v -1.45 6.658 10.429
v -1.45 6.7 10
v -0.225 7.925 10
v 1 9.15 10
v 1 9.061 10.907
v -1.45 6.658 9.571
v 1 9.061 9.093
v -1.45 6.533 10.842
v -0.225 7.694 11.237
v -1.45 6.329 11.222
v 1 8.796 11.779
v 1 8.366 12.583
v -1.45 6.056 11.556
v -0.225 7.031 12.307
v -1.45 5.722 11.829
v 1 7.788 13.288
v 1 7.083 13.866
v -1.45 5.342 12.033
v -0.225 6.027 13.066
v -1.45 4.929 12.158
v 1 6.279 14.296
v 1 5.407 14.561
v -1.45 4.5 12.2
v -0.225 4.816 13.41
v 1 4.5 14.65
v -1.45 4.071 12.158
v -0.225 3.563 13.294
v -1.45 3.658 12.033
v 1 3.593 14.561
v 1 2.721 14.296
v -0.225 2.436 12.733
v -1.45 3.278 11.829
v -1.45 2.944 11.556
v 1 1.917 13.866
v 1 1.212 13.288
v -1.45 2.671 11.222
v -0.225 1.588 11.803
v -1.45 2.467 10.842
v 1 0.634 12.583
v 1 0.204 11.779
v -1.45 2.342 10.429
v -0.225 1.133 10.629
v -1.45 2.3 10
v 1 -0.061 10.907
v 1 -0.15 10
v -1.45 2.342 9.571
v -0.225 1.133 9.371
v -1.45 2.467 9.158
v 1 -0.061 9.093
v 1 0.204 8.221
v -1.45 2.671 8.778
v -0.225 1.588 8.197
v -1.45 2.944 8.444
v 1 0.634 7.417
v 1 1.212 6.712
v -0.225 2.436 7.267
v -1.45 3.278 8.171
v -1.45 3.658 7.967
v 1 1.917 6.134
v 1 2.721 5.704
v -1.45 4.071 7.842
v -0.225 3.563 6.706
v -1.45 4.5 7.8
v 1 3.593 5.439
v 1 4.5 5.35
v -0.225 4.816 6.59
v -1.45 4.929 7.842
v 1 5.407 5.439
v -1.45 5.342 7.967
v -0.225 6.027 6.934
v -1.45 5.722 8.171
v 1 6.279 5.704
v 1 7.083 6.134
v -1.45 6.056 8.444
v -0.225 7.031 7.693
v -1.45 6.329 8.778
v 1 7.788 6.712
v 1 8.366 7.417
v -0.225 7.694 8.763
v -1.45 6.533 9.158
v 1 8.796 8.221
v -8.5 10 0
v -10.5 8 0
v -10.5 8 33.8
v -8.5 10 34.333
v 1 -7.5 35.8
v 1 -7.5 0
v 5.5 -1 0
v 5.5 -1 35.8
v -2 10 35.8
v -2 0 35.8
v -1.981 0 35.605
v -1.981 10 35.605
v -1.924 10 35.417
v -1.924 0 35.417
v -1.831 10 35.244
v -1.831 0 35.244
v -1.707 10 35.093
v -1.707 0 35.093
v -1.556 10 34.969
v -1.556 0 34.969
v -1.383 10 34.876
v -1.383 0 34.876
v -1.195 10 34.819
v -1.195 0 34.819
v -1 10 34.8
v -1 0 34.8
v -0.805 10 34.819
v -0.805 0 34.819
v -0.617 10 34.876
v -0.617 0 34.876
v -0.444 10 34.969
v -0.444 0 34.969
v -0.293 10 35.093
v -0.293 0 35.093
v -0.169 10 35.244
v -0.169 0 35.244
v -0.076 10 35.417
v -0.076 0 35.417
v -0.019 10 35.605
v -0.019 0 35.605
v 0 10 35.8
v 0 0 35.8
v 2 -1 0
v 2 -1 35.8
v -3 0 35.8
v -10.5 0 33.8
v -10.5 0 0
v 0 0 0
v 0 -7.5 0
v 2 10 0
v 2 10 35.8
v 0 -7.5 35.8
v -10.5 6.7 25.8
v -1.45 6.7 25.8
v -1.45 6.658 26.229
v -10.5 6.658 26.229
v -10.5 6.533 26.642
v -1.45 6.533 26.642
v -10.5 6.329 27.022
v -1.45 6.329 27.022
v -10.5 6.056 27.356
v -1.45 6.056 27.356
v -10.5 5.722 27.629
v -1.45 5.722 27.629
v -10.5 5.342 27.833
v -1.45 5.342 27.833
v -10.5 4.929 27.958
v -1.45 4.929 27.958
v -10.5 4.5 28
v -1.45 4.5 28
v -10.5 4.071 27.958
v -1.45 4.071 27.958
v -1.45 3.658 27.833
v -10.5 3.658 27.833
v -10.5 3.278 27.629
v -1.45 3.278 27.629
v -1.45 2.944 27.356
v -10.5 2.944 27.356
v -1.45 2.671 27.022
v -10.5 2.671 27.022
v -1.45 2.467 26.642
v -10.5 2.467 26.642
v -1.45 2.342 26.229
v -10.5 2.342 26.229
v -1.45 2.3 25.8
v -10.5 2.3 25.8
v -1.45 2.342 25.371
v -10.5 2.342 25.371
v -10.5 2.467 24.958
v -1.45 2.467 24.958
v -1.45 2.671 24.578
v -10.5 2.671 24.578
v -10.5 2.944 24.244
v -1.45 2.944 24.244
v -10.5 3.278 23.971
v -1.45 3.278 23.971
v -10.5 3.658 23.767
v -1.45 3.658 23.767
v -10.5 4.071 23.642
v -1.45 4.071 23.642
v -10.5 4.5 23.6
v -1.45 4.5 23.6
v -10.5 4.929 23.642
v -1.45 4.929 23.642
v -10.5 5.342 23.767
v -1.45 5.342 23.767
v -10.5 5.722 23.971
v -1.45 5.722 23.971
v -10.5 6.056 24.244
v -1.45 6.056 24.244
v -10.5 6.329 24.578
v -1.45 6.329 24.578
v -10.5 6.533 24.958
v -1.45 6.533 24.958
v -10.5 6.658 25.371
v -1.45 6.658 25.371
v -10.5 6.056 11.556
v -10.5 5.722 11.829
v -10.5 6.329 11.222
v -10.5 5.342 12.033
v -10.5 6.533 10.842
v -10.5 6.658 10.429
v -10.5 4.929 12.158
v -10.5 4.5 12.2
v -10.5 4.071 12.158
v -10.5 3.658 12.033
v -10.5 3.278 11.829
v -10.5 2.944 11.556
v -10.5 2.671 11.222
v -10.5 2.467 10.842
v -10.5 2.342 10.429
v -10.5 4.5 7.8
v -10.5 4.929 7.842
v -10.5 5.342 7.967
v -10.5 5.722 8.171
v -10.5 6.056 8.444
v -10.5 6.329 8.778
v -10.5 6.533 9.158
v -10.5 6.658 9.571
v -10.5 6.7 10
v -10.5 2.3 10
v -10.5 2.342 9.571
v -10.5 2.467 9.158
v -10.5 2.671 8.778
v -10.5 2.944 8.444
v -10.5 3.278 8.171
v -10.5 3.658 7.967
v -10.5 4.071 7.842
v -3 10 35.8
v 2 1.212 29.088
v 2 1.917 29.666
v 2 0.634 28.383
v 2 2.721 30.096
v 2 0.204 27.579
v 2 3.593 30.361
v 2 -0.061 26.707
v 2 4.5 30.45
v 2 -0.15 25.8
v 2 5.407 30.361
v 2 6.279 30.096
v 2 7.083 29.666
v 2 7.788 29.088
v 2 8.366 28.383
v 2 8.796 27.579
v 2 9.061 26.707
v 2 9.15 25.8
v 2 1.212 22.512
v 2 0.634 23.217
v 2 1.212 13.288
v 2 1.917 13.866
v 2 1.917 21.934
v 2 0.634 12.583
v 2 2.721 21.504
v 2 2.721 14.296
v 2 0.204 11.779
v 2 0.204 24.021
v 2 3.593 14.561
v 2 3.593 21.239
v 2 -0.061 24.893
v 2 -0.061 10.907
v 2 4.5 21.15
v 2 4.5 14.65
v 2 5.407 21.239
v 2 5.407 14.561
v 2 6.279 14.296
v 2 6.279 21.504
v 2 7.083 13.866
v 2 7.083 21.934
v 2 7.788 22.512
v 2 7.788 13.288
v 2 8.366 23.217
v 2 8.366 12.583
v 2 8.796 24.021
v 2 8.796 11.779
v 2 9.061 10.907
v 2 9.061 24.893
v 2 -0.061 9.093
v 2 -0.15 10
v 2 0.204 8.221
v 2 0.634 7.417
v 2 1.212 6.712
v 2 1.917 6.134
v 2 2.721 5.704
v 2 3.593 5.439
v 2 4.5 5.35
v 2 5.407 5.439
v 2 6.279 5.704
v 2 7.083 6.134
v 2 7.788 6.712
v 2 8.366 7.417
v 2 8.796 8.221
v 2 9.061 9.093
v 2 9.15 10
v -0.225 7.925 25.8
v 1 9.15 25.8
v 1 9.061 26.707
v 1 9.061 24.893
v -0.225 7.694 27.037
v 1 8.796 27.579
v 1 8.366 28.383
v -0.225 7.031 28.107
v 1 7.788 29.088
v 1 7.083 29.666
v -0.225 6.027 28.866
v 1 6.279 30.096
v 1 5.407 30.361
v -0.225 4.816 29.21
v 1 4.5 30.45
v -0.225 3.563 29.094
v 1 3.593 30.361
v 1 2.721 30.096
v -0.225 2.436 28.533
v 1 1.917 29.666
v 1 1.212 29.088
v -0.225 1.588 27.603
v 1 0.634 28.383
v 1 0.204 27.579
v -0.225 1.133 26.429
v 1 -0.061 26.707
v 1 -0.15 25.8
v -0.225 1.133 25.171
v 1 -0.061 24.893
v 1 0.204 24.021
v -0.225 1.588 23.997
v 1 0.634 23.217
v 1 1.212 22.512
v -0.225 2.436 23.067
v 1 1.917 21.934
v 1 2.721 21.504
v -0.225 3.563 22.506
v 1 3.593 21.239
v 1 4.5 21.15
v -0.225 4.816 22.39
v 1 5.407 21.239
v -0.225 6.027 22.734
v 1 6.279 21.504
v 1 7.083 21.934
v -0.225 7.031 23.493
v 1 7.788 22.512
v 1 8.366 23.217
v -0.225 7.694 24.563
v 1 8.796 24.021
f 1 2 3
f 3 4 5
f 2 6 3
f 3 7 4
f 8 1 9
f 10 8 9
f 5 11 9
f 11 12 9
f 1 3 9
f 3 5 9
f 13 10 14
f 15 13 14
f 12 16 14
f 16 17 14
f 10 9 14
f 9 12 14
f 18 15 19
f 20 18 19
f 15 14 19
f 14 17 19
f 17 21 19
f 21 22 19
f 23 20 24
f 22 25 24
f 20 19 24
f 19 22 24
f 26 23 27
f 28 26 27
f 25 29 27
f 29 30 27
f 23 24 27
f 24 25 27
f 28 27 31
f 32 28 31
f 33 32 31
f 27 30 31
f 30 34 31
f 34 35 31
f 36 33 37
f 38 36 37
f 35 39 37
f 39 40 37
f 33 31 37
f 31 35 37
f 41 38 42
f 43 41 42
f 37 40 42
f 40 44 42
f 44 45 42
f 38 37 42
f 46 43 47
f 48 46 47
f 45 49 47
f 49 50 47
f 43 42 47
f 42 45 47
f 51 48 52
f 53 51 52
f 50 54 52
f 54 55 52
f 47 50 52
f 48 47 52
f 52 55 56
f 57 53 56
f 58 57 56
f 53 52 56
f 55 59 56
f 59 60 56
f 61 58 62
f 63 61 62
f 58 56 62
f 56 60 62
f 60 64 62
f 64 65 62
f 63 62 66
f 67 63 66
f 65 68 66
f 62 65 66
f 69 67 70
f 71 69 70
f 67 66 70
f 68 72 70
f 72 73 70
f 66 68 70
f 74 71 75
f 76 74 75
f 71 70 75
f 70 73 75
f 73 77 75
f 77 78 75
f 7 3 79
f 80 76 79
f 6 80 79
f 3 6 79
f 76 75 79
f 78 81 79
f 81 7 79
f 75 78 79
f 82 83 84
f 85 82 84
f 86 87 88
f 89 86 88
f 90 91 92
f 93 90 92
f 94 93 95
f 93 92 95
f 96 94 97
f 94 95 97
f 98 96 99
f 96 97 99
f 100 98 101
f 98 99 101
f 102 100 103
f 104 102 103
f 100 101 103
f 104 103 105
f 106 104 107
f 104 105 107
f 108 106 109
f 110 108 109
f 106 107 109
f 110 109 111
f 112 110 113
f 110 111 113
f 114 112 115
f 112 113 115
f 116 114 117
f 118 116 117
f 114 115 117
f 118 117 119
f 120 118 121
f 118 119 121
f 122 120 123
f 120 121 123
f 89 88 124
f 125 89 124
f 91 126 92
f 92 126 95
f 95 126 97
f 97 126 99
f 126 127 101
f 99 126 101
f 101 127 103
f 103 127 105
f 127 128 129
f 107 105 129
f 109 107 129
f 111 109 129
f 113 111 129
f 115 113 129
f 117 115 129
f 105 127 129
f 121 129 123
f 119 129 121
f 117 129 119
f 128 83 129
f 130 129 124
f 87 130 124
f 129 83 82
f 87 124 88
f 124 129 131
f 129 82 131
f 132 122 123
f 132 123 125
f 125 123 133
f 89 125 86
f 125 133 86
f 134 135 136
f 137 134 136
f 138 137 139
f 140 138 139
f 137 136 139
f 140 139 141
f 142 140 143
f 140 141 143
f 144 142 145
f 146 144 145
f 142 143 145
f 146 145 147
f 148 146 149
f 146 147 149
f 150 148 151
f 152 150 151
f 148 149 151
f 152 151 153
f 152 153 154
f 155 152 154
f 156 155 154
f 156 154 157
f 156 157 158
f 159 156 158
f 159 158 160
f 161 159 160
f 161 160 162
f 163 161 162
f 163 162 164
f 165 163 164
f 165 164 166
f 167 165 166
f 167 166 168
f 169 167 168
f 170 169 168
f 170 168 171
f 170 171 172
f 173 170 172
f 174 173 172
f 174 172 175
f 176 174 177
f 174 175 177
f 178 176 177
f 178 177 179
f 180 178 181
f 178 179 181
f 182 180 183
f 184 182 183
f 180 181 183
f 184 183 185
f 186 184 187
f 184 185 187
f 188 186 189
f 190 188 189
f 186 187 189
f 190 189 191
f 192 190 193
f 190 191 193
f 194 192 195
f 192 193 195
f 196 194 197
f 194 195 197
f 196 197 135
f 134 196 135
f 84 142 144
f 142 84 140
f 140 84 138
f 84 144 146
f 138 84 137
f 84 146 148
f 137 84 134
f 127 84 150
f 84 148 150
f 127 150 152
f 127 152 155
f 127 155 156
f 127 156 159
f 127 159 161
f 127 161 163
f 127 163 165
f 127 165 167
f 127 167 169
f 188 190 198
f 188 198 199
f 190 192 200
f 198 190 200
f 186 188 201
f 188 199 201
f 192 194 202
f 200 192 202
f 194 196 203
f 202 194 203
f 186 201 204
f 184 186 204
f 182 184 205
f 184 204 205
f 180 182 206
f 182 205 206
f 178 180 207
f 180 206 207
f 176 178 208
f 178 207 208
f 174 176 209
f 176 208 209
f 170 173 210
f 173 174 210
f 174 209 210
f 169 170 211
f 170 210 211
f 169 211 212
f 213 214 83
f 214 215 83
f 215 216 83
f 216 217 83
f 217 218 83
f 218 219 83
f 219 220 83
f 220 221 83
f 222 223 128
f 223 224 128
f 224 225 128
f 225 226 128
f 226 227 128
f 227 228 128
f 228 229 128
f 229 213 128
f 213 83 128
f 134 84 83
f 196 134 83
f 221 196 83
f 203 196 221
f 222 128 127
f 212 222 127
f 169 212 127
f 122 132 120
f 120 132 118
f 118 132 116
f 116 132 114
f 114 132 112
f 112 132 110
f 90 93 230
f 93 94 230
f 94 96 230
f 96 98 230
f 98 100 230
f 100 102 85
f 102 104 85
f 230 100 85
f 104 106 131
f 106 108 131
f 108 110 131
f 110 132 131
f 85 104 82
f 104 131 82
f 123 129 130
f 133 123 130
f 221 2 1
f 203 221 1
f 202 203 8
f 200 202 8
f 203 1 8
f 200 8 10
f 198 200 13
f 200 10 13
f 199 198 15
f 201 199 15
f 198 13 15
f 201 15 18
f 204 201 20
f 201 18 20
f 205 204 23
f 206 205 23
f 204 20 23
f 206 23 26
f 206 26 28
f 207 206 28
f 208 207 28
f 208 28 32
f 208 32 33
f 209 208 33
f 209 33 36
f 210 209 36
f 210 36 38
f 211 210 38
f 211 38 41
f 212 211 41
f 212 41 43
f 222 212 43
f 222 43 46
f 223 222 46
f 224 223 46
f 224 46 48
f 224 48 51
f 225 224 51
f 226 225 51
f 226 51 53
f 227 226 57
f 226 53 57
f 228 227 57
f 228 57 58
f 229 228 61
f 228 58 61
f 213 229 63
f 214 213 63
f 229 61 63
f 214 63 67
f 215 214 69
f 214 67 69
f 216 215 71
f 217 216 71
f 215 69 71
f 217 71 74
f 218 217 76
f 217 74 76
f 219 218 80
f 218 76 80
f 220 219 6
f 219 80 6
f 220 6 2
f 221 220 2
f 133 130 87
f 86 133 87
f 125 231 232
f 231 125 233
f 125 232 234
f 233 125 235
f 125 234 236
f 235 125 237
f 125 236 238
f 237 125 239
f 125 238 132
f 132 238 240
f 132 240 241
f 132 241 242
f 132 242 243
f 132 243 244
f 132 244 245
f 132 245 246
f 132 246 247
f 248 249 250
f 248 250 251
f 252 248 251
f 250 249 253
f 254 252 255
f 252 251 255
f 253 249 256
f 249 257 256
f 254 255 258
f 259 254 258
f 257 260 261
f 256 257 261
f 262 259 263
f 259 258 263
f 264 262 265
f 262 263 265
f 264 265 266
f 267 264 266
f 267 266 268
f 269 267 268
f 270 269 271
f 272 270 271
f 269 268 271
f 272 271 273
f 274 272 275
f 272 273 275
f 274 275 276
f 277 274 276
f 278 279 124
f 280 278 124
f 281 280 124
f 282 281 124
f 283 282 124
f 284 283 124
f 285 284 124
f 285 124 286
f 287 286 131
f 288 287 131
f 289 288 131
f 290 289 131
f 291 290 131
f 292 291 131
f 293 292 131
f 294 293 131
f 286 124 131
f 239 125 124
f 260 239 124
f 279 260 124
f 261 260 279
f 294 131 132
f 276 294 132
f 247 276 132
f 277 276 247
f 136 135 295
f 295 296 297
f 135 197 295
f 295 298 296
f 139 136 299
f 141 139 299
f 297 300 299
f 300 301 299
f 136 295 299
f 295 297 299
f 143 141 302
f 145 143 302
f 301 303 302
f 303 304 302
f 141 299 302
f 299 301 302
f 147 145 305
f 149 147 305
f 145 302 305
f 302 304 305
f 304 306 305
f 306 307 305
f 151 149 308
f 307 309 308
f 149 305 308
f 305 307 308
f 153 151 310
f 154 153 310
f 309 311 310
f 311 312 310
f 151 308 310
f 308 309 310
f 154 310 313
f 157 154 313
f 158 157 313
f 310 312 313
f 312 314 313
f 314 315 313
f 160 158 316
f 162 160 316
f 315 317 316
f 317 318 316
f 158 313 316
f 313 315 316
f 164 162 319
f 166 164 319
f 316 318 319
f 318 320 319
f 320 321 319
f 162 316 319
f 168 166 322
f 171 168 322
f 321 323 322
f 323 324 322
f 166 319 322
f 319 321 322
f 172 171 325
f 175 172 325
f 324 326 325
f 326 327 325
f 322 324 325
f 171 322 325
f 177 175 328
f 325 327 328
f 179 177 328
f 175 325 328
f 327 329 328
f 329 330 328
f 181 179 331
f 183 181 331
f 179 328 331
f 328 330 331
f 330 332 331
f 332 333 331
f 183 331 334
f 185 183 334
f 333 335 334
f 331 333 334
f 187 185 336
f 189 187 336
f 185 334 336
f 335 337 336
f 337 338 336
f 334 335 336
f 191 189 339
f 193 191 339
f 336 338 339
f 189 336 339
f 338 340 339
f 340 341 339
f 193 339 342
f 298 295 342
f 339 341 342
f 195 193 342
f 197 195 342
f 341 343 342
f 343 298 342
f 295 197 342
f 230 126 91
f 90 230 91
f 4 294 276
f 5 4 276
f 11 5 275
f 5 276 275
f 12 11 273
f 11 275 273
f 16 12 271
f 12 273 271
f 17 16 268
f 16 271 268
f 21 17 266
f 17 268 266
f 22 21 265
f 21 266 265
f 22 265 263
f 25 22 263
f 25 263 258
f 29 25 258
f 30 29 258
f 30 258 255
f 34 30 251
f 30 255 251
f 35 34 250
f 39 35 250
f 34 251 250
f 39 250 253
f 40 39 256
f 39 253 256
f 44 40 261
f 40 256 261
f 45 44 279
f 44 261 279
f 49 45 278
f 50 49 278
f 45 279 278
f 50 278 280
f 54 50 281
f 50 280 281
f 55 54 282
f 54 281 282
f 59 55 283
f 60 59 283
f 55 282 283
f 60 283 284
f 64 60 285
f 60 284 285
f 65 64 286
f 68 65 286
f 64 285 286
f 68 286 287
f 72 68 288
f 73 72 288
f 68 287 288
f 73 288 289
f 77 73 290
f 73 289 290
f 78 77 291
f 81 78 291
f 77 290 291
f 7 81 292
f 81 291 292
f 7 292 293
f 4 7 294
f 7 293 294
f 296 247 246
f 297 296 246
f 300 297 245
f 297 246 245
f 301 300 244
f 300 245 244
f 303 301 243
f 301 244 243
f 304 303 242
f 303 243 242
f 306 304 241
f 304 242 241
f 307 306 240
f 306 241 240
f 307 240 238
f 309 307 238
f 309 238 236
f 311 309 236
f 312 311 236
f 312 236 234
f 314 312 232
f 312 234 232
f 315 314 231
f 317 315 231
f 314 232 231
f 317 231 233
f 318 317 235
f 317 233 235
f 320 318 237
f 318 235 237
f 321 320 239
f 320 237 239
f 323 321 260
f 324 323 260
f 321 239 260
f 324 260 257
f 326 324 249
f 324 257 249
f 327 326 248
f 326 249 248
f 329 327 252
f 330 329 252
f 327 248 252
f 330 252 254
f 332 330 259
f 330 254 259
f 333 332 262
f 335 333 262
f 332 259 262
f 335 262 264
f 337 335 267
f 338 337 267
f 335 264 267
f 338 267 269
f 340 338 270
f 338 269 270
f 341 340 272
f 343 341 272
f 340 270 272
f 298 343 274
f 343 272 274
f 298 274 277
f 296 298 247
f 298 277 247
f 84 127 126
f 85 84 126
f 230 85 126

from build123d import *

# Parameters (mm, degrees)
F1_DEPTH = 40
F3_DEPTH = 12.5
F4_R     = 2.2
F5_DEPTH = 12.501
F7_SIZE  = 2
F6_R     = 4.65
F8_DEPTH = 1
F9_SIZE  = 2.44999


# Not quite as in the source:
# - a fillet or chamfer is up to 0.001 mm smaller than in the source, because OpenCascade refuses the exact size


with BuildPart() as f1:
    # F0 (on Top) → F1 (new body)
    with BuildSketch(Plane.XY):
        Polygon((2, 10), (-10.5, 10), (-10.5, 0), (0, 0), (0, -7.5), (1, -7.5), (5.5, -1), (2, -1), align=None)
    extrude(amount=F1_DEPTH)

    # F2 (on face) → F3 (cut, symmetric)
    with BuildSketch(Plane.XZ):
        with BuildLine():
            ThreePointArc((-2, 35.8), (-1, 34.8), (0, 35.8))
            Line((0, 35.8), (5.5, 35.8))
            Line((5.5, 35.8), (5.5, 40))
            Line((5.5, 40), (-10.5, 40))
            Line((-10.5, 40), (-10.5, 33.8))
            Line((-10.5, 33.8), (-3, 35.8))
            Line((-3, 35.8), (-2, 35.8))
        make_face()
    extrude(amount=F3_DEPTH, both=True, mode=Mode.SUBTRACT)

    # F4 (on face) → F5 (cut, through all)
    with BuildSketch(Plane.YZ.offset(2)):
        with Locations((4.5, 25.8)):
            Circle(F4_R)
        with Locations((4.5, 10)):
            Circle(F4_R)
    extrude(amount=-F5_DEPTH, mode=Mode.SUBTRACT)

    # F7
    f7_edges = [f1.edges().sort_by_distance(p)[0] for p in [
        (-10.5, 10, 16.9),
    ]]
    chamfer(f7_edges, length=F7_SIZE)

    # F6 (on face) → F8 (cut)
    with BuildSketch(Plane.YZ.offset(2)):
        with Locations((4.5, 25.8)):
            Circle(F6_R)
        with Locations((4.5, 10)):
            Circle(F6_R)
    extrude(amount=-F8_DEPTH, mode=Mode.SUBTRACT)

    # F9 (size 2.45 in the source; OpenCascade refuses exactly that, so slightly less here)
    f9_edges = [f1.edges().sort_by_distance(p)[0] for p in [
        (1, 2.3, 25.8),
        (1, 2.3, 10),
    ]]
    chamfer(f9_edges, length=F9_SIZE)


solid = f1.part
